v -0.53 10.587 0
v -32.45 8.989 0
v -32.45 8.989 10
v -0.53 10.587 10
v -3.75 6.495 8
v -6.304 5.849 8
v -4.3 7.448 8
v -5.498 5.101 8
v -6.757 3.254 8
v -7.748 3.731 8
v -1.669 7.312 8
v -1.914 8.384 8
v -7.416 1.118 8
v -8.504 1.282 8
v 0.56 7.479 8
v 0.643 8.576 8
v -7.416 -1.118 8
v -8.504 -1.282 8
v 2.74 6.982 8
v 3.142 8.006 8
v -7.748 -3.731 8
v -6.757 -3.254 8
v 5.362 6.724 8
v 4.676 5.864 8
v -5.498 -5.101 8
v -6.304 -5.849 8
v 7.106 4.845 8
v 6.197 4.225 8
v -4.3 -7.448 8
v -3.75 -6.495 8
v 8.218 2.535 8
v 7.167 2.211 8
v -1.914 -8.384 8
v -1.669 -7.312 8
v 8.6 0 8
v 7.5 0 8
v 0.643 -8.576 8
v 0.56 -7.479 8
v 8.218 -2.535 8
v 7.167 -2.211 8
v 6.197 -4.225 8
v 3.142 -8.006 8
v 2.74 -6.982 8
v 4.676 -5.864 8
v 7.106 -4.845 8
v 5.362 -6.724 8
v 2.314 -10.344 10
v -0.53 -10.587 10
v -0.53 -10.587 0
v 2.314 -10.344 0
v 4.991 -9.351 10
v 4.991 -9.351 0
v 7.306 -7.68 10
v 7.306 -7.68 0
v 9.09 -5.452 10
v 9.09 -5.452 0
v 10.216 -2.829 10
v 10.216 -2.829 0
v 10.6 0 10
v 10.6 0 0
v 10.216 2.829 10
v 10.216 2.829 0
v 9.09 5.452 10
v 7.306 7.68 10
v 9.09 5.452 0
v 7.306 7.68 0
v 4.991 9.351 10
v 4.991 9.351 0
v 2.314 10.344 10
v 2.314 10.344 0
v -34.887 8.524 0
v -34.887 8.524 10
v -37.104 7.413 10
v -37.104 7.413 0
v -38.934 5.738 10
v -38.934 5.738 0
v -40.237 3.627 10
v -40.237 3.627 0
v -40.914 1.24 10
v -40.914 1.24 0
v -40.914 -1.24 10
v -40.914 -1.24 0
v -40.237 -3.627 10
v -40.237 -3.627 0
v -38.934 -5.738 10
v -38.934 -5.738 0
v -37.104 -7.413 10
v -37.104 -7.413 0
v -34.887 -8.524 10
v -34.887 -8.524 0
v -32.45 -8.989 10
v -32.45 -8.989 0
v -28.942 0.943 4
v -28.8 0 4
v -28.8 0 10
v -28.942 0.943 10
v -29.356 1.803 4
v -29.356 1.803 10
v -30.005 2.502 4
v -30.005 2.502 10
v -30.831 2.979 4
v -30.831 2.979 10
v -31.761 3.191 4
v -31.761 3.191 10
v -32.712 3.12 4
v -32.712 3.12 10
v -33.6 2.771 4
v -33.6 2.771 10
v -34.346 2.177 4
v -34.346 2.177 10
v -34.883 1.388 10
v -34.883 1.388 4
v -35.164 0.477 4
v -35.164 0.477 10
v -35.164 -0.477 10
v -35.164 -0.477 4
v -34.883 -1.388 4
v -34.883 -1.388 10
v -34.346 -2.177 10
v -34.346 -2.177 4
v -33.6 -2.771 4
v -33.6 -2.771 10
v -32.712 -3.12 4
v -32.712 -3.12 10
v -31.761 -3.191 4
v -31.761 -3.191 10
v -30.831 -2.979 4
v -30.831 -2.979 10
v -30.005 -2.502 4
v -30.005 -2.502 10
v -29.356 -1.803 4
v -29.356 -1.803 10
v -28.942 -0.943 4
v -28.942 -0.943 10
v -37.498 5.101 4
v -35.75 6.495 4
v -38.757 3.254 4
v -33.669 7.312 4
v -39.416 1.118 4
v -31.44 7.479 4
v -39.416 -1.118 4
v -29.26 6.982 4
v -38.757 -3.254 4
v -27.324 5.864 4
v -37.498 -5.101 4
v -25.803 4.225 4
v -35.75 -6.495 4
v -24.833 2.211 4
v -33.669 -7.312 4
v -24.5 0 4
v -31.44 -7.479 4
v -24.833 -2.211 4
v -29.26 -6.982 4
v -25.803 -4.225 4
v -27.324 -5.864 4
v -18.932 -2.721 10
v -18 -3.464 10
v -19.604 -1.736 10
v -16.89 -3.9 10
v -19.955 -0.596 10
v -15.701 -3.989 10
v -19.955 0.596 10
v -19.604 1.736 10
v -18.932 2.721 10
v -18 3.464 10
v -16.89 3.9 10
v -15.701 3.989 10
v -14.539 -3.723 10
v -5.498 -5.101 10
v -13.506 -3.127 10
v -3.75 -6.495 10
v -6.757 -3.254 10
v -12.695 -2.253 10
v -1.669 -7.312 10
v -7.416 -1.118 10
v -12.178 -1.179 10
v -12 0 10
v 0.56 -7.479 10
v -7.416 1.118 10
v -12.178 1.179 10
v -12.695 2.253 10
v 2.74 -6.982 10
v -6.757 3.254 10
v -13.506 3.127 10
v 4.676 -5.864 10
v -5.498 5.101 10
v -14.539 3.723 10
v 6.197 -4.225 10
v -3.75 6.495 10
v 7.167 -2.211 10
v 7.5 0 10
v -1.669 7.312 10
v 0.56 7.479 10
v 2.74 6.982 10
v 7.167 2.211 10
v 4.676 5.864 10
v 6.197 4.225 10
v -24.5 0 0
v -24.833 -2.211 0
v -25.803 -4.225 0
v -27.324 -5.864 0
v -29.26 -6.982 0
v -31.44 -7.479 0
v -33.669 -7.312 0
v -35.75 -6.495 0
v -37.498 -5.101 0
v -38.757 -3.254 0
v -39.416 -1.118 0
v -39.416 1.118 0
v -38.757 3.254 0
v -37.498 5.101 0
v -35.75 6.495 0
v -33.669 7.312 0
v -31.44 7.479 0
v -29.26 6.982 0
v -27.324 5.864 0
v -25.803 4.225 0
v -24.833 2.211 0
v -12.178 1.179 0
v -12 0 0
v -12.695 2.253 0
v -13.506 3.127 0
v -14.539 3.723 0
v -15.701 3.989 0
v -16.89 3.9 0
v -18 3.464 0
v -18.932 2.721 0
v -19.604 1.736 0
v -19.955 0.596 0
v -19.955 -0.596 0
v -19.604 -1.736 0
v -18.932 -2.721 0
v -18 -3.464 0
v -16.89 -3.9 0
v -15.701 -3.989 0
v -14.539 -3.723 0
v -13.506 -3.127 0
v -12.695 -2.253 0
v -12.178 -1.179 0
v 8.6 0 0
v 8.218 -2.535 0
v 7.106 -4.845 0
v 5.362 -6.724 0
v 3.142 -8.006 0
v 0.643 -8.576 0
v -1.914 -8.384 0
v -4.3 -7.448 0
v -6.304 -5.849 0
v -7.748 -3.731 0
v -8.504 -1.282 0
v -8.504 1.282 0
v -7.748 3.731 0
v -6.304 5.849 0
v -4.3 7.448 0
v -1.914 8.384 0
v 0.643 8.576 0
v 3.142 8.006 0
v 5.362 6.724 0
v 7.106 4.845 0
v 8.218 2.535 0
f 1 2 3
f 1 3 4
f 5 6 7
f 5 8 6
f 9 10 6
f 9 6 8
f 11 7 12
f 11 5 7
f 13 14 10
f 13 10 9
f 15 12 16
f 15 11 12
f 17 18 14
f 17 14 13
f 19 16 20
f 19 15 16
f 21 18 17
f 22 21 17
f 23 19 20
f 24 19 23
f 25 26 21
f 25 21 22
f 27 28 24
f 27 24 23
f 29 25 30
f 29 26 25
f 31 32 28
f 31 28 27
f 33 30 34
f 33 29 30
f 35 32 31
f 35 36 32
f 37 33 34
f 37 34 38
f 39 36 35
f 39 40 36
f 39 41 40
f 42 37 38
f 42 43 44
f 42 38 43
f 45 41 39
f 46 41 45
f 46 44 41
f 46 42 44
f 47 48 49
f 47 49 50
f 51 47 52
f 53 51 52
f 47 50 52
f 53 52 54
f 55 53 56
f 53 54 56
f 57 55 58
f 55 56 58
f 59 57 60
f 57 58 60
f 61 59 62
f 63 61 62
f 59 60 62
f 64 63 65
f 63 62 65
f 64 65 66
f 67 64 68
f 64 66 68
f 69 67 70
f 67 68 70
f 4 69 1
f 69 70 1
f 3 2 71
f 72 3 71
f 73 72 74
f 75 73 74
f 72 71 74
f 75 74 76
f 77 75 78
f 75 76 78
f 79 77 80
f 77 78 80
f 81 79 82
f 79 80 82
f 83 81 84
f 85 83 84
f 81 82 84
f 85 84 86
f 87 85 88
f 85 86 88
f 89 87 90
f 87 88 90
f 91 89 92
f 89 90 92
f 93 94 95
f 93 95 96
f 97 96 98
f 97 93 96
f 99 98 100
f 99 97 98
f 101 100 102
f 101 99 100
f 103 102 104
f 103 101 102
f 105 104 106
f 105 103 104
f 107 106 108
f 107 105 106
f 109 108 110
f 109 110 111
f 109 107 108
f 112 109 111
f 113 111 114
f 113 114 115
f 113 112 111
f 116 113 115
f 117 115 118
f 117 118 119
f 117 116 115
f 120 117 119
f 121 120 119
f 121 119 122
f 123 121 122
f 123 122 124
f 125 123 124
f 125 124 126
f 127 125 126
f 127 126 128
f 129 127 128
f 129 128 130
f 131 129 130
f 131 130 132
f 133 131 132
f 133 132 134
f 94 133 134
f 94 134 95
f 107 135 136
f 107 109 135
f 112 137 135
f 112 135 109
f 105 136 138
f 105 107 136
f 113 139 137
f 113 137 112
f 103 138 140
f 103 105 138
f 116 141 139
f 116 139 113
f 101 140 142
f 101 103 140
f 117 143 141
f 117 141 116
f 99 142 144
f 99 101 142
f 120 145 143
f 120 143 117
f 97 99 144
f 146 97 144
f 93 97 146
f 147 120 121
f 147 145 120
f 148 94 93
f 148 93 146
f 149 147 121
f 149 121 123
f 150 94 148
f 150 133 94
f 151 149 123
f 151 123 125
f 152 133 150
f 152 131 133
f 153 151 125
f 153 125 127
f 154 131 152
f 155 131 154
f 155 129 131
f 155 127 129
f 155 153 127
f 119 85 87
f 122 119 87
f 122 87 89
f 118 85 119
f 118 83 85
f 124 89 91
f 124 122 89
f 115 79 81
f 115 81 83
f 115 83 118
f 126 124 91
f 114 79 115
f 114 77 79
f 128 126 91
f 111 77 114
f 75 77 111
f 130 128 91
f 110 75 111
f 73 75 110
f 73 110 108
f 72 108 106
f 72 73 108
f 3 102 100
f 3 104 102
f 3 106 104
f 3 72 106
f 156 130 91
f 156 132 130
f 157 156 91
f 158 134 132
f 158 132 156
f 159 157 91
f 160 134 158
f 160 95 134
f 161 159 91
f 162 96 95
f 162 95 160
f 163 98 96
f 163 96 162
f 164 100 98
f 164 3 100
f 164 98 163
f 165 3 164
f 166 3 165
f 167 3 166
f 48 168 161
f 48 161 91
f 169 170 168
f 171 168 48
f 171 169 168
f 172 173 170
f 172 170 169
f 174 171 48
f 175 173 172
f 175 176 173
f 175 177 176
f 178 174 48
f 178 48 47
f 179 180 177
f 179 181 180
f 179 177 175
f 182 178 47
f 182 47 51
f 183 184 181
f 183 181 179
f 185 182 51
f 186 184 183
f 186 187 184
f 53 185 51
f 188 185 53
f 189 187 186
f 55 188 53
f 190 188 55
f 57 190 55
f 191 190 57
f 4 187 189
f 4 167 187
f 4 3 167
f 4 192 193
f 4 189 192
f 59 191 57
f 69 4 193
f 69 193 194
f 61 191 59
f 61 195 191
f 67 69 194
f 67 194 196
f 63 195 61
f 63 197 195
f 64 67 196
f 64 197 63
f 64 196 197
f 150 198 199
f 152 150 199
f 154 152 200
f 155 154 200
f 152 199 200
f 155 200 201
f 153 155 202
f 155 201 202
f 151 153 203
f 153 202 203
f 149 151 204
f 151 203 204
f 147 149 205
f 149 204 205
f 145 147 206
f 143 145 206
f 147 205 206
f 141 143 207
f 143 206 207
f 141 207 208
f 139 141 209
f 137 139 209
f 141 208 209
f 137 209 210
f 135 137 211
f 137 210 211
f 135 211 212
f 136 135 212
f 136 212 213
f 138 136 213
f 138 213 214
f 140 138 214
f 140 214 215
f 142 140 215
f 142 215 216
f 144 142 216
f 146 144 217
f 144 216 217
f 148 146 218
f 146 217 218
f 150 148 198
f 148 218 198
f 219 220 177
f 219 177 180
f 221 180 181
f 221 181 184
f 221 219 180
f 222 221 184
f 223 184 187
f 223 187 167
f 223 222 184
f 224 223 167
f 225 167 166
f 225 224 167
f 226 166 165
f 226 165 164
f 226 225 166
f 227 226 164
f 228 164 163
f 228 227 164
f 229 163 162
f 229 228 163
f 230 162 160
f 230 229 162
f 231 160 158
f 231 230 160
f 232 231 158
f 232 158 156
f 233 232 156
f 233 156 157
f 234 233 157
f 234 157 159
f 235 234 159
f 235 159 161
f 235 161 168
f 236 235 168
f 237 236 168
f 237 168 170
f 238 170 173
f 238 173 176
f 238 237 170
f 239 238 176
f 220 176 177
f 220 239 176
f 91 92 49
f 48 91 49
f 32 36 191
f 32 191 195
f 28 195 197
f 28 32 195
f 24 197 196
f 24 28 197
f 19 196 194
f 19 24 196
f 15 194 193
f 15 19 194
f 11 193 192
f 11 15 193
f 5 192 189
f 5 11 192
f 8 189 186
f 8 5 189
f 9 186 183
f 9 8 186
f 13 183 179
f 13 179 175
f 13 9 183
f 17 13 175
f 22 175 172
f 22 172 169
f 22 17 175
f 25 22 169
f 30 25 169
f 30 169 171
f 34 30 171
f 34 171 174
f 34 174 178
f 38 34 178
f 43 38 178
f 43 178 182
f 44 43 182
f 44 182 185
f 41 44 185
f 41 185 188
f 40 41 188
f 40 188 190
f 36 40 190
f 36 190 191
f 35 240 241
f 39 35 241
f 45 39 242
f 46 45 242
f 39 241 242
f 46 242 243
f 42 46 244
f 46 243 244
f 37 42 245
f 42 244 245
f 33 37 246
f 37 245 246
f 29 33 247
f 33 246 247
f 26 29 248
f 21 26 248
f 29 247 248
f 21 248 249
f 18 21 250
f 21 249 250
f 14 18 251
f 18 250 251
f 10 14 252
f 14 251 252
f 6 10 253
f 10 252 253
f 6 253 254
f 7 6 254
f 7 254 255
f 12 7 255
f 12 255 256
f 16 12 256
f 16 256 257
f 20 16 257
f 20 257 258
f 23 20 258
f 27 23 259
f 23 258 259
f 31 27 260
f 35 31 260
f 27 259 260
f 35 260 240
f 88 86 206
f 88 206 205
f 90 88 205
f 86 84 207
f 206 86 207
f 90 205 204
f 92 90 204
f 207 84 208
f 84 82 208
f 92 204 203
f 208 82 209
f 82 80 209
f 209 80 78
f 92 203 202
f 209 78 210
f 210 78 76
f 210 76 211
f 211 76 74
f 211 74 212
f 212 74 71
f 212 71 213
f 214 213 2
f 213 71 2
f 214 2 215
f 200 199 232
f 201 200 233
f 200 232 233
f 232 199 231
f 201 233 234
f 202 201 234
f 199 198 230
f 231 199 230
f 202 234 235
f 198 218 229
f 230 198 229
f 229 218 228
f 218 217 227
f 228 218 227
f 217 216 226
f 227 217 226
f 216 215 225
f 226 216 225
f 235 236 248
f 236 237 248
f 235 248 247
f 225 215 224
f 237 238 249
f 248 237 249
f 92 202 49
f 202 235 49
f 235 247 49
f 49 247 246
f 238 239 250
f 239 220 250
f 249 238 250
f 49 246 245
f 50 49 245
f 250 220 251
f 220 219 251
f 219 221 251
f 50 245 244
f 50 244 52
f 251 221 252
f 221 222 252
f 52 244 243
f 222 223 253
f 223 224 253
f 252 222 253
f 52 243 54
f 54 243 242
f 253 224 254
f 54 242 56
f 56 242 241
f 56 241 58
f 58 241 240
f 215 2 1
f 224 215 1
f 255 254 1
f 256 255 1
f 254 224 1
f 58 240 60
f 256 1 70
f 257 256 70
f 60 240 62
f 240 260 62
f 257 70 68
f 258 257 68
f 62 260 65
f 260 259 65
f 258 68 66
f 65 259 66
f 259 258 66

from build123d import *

# Parameters (mm, degrees)
SKETCH_R        = 3.2
SKETCH_R_2      = 7.5
SKETCH_R_3      = 4
PAD_DEPTH       = 10
SKETCH001_R     = 8.6
POCKET_DEPTH    = 8
SKETCH002_R     = 7.5
POCKET001_DEPTH = 4


with BuildPart() as part:
    # Sketch → Pad (new body)
    with BuildSketch(Plane.XY):
        with BuildLine():
            ThreePointArc((-32.45, 8.988743), (-41, 0), (-32.45, -8.988743))
            Line((-32.45, -8.988743), (-0.53, -10.586742))
            ThreePointArc((-0.53, -10.586742), (10.6, 0), (-0.53, 10.586742))
            Line((-32.45, 8.988743), (-0.53, 10.586742))
        make_face()
        with Locations((-32, 0)):
            Circle(SKETCH_R, mode=Mode.SUBTRACT)
        Circle(SKETCH_R_2, mode=Mode.SUBTRACT)
        with Locations((-16, 0)):
            Circle(SKETCH_R_3, mode=Mode.SUBTRACT)
    extrude(amount=PAD_DEPTH)

    # Sketch001 → Pocket (cut)
    with BuildSketch(Plane(origin=(0, 0, 0), x_dir=(1, 0, 0), z_dir=(0, 0, -1))):
        Circle(SKETCH001_R)
    extrude(amount=-POCKET_DEPTH, mode=Mode.SUBTRACT)

    # Sketch002 → Pocket001 (cut)
    with BuildSketch(Plane(origin=(0, 0, 0), x_dir=(1, 0, 0), z_dir=(0, 0, -1))):
        with Locations((-32, 0)):
            Circle(SKETCH002_R)
    extrude(amount=-POCKET001_DEPTH, mode=Mode.SUBTRACT)


solid = part.part
